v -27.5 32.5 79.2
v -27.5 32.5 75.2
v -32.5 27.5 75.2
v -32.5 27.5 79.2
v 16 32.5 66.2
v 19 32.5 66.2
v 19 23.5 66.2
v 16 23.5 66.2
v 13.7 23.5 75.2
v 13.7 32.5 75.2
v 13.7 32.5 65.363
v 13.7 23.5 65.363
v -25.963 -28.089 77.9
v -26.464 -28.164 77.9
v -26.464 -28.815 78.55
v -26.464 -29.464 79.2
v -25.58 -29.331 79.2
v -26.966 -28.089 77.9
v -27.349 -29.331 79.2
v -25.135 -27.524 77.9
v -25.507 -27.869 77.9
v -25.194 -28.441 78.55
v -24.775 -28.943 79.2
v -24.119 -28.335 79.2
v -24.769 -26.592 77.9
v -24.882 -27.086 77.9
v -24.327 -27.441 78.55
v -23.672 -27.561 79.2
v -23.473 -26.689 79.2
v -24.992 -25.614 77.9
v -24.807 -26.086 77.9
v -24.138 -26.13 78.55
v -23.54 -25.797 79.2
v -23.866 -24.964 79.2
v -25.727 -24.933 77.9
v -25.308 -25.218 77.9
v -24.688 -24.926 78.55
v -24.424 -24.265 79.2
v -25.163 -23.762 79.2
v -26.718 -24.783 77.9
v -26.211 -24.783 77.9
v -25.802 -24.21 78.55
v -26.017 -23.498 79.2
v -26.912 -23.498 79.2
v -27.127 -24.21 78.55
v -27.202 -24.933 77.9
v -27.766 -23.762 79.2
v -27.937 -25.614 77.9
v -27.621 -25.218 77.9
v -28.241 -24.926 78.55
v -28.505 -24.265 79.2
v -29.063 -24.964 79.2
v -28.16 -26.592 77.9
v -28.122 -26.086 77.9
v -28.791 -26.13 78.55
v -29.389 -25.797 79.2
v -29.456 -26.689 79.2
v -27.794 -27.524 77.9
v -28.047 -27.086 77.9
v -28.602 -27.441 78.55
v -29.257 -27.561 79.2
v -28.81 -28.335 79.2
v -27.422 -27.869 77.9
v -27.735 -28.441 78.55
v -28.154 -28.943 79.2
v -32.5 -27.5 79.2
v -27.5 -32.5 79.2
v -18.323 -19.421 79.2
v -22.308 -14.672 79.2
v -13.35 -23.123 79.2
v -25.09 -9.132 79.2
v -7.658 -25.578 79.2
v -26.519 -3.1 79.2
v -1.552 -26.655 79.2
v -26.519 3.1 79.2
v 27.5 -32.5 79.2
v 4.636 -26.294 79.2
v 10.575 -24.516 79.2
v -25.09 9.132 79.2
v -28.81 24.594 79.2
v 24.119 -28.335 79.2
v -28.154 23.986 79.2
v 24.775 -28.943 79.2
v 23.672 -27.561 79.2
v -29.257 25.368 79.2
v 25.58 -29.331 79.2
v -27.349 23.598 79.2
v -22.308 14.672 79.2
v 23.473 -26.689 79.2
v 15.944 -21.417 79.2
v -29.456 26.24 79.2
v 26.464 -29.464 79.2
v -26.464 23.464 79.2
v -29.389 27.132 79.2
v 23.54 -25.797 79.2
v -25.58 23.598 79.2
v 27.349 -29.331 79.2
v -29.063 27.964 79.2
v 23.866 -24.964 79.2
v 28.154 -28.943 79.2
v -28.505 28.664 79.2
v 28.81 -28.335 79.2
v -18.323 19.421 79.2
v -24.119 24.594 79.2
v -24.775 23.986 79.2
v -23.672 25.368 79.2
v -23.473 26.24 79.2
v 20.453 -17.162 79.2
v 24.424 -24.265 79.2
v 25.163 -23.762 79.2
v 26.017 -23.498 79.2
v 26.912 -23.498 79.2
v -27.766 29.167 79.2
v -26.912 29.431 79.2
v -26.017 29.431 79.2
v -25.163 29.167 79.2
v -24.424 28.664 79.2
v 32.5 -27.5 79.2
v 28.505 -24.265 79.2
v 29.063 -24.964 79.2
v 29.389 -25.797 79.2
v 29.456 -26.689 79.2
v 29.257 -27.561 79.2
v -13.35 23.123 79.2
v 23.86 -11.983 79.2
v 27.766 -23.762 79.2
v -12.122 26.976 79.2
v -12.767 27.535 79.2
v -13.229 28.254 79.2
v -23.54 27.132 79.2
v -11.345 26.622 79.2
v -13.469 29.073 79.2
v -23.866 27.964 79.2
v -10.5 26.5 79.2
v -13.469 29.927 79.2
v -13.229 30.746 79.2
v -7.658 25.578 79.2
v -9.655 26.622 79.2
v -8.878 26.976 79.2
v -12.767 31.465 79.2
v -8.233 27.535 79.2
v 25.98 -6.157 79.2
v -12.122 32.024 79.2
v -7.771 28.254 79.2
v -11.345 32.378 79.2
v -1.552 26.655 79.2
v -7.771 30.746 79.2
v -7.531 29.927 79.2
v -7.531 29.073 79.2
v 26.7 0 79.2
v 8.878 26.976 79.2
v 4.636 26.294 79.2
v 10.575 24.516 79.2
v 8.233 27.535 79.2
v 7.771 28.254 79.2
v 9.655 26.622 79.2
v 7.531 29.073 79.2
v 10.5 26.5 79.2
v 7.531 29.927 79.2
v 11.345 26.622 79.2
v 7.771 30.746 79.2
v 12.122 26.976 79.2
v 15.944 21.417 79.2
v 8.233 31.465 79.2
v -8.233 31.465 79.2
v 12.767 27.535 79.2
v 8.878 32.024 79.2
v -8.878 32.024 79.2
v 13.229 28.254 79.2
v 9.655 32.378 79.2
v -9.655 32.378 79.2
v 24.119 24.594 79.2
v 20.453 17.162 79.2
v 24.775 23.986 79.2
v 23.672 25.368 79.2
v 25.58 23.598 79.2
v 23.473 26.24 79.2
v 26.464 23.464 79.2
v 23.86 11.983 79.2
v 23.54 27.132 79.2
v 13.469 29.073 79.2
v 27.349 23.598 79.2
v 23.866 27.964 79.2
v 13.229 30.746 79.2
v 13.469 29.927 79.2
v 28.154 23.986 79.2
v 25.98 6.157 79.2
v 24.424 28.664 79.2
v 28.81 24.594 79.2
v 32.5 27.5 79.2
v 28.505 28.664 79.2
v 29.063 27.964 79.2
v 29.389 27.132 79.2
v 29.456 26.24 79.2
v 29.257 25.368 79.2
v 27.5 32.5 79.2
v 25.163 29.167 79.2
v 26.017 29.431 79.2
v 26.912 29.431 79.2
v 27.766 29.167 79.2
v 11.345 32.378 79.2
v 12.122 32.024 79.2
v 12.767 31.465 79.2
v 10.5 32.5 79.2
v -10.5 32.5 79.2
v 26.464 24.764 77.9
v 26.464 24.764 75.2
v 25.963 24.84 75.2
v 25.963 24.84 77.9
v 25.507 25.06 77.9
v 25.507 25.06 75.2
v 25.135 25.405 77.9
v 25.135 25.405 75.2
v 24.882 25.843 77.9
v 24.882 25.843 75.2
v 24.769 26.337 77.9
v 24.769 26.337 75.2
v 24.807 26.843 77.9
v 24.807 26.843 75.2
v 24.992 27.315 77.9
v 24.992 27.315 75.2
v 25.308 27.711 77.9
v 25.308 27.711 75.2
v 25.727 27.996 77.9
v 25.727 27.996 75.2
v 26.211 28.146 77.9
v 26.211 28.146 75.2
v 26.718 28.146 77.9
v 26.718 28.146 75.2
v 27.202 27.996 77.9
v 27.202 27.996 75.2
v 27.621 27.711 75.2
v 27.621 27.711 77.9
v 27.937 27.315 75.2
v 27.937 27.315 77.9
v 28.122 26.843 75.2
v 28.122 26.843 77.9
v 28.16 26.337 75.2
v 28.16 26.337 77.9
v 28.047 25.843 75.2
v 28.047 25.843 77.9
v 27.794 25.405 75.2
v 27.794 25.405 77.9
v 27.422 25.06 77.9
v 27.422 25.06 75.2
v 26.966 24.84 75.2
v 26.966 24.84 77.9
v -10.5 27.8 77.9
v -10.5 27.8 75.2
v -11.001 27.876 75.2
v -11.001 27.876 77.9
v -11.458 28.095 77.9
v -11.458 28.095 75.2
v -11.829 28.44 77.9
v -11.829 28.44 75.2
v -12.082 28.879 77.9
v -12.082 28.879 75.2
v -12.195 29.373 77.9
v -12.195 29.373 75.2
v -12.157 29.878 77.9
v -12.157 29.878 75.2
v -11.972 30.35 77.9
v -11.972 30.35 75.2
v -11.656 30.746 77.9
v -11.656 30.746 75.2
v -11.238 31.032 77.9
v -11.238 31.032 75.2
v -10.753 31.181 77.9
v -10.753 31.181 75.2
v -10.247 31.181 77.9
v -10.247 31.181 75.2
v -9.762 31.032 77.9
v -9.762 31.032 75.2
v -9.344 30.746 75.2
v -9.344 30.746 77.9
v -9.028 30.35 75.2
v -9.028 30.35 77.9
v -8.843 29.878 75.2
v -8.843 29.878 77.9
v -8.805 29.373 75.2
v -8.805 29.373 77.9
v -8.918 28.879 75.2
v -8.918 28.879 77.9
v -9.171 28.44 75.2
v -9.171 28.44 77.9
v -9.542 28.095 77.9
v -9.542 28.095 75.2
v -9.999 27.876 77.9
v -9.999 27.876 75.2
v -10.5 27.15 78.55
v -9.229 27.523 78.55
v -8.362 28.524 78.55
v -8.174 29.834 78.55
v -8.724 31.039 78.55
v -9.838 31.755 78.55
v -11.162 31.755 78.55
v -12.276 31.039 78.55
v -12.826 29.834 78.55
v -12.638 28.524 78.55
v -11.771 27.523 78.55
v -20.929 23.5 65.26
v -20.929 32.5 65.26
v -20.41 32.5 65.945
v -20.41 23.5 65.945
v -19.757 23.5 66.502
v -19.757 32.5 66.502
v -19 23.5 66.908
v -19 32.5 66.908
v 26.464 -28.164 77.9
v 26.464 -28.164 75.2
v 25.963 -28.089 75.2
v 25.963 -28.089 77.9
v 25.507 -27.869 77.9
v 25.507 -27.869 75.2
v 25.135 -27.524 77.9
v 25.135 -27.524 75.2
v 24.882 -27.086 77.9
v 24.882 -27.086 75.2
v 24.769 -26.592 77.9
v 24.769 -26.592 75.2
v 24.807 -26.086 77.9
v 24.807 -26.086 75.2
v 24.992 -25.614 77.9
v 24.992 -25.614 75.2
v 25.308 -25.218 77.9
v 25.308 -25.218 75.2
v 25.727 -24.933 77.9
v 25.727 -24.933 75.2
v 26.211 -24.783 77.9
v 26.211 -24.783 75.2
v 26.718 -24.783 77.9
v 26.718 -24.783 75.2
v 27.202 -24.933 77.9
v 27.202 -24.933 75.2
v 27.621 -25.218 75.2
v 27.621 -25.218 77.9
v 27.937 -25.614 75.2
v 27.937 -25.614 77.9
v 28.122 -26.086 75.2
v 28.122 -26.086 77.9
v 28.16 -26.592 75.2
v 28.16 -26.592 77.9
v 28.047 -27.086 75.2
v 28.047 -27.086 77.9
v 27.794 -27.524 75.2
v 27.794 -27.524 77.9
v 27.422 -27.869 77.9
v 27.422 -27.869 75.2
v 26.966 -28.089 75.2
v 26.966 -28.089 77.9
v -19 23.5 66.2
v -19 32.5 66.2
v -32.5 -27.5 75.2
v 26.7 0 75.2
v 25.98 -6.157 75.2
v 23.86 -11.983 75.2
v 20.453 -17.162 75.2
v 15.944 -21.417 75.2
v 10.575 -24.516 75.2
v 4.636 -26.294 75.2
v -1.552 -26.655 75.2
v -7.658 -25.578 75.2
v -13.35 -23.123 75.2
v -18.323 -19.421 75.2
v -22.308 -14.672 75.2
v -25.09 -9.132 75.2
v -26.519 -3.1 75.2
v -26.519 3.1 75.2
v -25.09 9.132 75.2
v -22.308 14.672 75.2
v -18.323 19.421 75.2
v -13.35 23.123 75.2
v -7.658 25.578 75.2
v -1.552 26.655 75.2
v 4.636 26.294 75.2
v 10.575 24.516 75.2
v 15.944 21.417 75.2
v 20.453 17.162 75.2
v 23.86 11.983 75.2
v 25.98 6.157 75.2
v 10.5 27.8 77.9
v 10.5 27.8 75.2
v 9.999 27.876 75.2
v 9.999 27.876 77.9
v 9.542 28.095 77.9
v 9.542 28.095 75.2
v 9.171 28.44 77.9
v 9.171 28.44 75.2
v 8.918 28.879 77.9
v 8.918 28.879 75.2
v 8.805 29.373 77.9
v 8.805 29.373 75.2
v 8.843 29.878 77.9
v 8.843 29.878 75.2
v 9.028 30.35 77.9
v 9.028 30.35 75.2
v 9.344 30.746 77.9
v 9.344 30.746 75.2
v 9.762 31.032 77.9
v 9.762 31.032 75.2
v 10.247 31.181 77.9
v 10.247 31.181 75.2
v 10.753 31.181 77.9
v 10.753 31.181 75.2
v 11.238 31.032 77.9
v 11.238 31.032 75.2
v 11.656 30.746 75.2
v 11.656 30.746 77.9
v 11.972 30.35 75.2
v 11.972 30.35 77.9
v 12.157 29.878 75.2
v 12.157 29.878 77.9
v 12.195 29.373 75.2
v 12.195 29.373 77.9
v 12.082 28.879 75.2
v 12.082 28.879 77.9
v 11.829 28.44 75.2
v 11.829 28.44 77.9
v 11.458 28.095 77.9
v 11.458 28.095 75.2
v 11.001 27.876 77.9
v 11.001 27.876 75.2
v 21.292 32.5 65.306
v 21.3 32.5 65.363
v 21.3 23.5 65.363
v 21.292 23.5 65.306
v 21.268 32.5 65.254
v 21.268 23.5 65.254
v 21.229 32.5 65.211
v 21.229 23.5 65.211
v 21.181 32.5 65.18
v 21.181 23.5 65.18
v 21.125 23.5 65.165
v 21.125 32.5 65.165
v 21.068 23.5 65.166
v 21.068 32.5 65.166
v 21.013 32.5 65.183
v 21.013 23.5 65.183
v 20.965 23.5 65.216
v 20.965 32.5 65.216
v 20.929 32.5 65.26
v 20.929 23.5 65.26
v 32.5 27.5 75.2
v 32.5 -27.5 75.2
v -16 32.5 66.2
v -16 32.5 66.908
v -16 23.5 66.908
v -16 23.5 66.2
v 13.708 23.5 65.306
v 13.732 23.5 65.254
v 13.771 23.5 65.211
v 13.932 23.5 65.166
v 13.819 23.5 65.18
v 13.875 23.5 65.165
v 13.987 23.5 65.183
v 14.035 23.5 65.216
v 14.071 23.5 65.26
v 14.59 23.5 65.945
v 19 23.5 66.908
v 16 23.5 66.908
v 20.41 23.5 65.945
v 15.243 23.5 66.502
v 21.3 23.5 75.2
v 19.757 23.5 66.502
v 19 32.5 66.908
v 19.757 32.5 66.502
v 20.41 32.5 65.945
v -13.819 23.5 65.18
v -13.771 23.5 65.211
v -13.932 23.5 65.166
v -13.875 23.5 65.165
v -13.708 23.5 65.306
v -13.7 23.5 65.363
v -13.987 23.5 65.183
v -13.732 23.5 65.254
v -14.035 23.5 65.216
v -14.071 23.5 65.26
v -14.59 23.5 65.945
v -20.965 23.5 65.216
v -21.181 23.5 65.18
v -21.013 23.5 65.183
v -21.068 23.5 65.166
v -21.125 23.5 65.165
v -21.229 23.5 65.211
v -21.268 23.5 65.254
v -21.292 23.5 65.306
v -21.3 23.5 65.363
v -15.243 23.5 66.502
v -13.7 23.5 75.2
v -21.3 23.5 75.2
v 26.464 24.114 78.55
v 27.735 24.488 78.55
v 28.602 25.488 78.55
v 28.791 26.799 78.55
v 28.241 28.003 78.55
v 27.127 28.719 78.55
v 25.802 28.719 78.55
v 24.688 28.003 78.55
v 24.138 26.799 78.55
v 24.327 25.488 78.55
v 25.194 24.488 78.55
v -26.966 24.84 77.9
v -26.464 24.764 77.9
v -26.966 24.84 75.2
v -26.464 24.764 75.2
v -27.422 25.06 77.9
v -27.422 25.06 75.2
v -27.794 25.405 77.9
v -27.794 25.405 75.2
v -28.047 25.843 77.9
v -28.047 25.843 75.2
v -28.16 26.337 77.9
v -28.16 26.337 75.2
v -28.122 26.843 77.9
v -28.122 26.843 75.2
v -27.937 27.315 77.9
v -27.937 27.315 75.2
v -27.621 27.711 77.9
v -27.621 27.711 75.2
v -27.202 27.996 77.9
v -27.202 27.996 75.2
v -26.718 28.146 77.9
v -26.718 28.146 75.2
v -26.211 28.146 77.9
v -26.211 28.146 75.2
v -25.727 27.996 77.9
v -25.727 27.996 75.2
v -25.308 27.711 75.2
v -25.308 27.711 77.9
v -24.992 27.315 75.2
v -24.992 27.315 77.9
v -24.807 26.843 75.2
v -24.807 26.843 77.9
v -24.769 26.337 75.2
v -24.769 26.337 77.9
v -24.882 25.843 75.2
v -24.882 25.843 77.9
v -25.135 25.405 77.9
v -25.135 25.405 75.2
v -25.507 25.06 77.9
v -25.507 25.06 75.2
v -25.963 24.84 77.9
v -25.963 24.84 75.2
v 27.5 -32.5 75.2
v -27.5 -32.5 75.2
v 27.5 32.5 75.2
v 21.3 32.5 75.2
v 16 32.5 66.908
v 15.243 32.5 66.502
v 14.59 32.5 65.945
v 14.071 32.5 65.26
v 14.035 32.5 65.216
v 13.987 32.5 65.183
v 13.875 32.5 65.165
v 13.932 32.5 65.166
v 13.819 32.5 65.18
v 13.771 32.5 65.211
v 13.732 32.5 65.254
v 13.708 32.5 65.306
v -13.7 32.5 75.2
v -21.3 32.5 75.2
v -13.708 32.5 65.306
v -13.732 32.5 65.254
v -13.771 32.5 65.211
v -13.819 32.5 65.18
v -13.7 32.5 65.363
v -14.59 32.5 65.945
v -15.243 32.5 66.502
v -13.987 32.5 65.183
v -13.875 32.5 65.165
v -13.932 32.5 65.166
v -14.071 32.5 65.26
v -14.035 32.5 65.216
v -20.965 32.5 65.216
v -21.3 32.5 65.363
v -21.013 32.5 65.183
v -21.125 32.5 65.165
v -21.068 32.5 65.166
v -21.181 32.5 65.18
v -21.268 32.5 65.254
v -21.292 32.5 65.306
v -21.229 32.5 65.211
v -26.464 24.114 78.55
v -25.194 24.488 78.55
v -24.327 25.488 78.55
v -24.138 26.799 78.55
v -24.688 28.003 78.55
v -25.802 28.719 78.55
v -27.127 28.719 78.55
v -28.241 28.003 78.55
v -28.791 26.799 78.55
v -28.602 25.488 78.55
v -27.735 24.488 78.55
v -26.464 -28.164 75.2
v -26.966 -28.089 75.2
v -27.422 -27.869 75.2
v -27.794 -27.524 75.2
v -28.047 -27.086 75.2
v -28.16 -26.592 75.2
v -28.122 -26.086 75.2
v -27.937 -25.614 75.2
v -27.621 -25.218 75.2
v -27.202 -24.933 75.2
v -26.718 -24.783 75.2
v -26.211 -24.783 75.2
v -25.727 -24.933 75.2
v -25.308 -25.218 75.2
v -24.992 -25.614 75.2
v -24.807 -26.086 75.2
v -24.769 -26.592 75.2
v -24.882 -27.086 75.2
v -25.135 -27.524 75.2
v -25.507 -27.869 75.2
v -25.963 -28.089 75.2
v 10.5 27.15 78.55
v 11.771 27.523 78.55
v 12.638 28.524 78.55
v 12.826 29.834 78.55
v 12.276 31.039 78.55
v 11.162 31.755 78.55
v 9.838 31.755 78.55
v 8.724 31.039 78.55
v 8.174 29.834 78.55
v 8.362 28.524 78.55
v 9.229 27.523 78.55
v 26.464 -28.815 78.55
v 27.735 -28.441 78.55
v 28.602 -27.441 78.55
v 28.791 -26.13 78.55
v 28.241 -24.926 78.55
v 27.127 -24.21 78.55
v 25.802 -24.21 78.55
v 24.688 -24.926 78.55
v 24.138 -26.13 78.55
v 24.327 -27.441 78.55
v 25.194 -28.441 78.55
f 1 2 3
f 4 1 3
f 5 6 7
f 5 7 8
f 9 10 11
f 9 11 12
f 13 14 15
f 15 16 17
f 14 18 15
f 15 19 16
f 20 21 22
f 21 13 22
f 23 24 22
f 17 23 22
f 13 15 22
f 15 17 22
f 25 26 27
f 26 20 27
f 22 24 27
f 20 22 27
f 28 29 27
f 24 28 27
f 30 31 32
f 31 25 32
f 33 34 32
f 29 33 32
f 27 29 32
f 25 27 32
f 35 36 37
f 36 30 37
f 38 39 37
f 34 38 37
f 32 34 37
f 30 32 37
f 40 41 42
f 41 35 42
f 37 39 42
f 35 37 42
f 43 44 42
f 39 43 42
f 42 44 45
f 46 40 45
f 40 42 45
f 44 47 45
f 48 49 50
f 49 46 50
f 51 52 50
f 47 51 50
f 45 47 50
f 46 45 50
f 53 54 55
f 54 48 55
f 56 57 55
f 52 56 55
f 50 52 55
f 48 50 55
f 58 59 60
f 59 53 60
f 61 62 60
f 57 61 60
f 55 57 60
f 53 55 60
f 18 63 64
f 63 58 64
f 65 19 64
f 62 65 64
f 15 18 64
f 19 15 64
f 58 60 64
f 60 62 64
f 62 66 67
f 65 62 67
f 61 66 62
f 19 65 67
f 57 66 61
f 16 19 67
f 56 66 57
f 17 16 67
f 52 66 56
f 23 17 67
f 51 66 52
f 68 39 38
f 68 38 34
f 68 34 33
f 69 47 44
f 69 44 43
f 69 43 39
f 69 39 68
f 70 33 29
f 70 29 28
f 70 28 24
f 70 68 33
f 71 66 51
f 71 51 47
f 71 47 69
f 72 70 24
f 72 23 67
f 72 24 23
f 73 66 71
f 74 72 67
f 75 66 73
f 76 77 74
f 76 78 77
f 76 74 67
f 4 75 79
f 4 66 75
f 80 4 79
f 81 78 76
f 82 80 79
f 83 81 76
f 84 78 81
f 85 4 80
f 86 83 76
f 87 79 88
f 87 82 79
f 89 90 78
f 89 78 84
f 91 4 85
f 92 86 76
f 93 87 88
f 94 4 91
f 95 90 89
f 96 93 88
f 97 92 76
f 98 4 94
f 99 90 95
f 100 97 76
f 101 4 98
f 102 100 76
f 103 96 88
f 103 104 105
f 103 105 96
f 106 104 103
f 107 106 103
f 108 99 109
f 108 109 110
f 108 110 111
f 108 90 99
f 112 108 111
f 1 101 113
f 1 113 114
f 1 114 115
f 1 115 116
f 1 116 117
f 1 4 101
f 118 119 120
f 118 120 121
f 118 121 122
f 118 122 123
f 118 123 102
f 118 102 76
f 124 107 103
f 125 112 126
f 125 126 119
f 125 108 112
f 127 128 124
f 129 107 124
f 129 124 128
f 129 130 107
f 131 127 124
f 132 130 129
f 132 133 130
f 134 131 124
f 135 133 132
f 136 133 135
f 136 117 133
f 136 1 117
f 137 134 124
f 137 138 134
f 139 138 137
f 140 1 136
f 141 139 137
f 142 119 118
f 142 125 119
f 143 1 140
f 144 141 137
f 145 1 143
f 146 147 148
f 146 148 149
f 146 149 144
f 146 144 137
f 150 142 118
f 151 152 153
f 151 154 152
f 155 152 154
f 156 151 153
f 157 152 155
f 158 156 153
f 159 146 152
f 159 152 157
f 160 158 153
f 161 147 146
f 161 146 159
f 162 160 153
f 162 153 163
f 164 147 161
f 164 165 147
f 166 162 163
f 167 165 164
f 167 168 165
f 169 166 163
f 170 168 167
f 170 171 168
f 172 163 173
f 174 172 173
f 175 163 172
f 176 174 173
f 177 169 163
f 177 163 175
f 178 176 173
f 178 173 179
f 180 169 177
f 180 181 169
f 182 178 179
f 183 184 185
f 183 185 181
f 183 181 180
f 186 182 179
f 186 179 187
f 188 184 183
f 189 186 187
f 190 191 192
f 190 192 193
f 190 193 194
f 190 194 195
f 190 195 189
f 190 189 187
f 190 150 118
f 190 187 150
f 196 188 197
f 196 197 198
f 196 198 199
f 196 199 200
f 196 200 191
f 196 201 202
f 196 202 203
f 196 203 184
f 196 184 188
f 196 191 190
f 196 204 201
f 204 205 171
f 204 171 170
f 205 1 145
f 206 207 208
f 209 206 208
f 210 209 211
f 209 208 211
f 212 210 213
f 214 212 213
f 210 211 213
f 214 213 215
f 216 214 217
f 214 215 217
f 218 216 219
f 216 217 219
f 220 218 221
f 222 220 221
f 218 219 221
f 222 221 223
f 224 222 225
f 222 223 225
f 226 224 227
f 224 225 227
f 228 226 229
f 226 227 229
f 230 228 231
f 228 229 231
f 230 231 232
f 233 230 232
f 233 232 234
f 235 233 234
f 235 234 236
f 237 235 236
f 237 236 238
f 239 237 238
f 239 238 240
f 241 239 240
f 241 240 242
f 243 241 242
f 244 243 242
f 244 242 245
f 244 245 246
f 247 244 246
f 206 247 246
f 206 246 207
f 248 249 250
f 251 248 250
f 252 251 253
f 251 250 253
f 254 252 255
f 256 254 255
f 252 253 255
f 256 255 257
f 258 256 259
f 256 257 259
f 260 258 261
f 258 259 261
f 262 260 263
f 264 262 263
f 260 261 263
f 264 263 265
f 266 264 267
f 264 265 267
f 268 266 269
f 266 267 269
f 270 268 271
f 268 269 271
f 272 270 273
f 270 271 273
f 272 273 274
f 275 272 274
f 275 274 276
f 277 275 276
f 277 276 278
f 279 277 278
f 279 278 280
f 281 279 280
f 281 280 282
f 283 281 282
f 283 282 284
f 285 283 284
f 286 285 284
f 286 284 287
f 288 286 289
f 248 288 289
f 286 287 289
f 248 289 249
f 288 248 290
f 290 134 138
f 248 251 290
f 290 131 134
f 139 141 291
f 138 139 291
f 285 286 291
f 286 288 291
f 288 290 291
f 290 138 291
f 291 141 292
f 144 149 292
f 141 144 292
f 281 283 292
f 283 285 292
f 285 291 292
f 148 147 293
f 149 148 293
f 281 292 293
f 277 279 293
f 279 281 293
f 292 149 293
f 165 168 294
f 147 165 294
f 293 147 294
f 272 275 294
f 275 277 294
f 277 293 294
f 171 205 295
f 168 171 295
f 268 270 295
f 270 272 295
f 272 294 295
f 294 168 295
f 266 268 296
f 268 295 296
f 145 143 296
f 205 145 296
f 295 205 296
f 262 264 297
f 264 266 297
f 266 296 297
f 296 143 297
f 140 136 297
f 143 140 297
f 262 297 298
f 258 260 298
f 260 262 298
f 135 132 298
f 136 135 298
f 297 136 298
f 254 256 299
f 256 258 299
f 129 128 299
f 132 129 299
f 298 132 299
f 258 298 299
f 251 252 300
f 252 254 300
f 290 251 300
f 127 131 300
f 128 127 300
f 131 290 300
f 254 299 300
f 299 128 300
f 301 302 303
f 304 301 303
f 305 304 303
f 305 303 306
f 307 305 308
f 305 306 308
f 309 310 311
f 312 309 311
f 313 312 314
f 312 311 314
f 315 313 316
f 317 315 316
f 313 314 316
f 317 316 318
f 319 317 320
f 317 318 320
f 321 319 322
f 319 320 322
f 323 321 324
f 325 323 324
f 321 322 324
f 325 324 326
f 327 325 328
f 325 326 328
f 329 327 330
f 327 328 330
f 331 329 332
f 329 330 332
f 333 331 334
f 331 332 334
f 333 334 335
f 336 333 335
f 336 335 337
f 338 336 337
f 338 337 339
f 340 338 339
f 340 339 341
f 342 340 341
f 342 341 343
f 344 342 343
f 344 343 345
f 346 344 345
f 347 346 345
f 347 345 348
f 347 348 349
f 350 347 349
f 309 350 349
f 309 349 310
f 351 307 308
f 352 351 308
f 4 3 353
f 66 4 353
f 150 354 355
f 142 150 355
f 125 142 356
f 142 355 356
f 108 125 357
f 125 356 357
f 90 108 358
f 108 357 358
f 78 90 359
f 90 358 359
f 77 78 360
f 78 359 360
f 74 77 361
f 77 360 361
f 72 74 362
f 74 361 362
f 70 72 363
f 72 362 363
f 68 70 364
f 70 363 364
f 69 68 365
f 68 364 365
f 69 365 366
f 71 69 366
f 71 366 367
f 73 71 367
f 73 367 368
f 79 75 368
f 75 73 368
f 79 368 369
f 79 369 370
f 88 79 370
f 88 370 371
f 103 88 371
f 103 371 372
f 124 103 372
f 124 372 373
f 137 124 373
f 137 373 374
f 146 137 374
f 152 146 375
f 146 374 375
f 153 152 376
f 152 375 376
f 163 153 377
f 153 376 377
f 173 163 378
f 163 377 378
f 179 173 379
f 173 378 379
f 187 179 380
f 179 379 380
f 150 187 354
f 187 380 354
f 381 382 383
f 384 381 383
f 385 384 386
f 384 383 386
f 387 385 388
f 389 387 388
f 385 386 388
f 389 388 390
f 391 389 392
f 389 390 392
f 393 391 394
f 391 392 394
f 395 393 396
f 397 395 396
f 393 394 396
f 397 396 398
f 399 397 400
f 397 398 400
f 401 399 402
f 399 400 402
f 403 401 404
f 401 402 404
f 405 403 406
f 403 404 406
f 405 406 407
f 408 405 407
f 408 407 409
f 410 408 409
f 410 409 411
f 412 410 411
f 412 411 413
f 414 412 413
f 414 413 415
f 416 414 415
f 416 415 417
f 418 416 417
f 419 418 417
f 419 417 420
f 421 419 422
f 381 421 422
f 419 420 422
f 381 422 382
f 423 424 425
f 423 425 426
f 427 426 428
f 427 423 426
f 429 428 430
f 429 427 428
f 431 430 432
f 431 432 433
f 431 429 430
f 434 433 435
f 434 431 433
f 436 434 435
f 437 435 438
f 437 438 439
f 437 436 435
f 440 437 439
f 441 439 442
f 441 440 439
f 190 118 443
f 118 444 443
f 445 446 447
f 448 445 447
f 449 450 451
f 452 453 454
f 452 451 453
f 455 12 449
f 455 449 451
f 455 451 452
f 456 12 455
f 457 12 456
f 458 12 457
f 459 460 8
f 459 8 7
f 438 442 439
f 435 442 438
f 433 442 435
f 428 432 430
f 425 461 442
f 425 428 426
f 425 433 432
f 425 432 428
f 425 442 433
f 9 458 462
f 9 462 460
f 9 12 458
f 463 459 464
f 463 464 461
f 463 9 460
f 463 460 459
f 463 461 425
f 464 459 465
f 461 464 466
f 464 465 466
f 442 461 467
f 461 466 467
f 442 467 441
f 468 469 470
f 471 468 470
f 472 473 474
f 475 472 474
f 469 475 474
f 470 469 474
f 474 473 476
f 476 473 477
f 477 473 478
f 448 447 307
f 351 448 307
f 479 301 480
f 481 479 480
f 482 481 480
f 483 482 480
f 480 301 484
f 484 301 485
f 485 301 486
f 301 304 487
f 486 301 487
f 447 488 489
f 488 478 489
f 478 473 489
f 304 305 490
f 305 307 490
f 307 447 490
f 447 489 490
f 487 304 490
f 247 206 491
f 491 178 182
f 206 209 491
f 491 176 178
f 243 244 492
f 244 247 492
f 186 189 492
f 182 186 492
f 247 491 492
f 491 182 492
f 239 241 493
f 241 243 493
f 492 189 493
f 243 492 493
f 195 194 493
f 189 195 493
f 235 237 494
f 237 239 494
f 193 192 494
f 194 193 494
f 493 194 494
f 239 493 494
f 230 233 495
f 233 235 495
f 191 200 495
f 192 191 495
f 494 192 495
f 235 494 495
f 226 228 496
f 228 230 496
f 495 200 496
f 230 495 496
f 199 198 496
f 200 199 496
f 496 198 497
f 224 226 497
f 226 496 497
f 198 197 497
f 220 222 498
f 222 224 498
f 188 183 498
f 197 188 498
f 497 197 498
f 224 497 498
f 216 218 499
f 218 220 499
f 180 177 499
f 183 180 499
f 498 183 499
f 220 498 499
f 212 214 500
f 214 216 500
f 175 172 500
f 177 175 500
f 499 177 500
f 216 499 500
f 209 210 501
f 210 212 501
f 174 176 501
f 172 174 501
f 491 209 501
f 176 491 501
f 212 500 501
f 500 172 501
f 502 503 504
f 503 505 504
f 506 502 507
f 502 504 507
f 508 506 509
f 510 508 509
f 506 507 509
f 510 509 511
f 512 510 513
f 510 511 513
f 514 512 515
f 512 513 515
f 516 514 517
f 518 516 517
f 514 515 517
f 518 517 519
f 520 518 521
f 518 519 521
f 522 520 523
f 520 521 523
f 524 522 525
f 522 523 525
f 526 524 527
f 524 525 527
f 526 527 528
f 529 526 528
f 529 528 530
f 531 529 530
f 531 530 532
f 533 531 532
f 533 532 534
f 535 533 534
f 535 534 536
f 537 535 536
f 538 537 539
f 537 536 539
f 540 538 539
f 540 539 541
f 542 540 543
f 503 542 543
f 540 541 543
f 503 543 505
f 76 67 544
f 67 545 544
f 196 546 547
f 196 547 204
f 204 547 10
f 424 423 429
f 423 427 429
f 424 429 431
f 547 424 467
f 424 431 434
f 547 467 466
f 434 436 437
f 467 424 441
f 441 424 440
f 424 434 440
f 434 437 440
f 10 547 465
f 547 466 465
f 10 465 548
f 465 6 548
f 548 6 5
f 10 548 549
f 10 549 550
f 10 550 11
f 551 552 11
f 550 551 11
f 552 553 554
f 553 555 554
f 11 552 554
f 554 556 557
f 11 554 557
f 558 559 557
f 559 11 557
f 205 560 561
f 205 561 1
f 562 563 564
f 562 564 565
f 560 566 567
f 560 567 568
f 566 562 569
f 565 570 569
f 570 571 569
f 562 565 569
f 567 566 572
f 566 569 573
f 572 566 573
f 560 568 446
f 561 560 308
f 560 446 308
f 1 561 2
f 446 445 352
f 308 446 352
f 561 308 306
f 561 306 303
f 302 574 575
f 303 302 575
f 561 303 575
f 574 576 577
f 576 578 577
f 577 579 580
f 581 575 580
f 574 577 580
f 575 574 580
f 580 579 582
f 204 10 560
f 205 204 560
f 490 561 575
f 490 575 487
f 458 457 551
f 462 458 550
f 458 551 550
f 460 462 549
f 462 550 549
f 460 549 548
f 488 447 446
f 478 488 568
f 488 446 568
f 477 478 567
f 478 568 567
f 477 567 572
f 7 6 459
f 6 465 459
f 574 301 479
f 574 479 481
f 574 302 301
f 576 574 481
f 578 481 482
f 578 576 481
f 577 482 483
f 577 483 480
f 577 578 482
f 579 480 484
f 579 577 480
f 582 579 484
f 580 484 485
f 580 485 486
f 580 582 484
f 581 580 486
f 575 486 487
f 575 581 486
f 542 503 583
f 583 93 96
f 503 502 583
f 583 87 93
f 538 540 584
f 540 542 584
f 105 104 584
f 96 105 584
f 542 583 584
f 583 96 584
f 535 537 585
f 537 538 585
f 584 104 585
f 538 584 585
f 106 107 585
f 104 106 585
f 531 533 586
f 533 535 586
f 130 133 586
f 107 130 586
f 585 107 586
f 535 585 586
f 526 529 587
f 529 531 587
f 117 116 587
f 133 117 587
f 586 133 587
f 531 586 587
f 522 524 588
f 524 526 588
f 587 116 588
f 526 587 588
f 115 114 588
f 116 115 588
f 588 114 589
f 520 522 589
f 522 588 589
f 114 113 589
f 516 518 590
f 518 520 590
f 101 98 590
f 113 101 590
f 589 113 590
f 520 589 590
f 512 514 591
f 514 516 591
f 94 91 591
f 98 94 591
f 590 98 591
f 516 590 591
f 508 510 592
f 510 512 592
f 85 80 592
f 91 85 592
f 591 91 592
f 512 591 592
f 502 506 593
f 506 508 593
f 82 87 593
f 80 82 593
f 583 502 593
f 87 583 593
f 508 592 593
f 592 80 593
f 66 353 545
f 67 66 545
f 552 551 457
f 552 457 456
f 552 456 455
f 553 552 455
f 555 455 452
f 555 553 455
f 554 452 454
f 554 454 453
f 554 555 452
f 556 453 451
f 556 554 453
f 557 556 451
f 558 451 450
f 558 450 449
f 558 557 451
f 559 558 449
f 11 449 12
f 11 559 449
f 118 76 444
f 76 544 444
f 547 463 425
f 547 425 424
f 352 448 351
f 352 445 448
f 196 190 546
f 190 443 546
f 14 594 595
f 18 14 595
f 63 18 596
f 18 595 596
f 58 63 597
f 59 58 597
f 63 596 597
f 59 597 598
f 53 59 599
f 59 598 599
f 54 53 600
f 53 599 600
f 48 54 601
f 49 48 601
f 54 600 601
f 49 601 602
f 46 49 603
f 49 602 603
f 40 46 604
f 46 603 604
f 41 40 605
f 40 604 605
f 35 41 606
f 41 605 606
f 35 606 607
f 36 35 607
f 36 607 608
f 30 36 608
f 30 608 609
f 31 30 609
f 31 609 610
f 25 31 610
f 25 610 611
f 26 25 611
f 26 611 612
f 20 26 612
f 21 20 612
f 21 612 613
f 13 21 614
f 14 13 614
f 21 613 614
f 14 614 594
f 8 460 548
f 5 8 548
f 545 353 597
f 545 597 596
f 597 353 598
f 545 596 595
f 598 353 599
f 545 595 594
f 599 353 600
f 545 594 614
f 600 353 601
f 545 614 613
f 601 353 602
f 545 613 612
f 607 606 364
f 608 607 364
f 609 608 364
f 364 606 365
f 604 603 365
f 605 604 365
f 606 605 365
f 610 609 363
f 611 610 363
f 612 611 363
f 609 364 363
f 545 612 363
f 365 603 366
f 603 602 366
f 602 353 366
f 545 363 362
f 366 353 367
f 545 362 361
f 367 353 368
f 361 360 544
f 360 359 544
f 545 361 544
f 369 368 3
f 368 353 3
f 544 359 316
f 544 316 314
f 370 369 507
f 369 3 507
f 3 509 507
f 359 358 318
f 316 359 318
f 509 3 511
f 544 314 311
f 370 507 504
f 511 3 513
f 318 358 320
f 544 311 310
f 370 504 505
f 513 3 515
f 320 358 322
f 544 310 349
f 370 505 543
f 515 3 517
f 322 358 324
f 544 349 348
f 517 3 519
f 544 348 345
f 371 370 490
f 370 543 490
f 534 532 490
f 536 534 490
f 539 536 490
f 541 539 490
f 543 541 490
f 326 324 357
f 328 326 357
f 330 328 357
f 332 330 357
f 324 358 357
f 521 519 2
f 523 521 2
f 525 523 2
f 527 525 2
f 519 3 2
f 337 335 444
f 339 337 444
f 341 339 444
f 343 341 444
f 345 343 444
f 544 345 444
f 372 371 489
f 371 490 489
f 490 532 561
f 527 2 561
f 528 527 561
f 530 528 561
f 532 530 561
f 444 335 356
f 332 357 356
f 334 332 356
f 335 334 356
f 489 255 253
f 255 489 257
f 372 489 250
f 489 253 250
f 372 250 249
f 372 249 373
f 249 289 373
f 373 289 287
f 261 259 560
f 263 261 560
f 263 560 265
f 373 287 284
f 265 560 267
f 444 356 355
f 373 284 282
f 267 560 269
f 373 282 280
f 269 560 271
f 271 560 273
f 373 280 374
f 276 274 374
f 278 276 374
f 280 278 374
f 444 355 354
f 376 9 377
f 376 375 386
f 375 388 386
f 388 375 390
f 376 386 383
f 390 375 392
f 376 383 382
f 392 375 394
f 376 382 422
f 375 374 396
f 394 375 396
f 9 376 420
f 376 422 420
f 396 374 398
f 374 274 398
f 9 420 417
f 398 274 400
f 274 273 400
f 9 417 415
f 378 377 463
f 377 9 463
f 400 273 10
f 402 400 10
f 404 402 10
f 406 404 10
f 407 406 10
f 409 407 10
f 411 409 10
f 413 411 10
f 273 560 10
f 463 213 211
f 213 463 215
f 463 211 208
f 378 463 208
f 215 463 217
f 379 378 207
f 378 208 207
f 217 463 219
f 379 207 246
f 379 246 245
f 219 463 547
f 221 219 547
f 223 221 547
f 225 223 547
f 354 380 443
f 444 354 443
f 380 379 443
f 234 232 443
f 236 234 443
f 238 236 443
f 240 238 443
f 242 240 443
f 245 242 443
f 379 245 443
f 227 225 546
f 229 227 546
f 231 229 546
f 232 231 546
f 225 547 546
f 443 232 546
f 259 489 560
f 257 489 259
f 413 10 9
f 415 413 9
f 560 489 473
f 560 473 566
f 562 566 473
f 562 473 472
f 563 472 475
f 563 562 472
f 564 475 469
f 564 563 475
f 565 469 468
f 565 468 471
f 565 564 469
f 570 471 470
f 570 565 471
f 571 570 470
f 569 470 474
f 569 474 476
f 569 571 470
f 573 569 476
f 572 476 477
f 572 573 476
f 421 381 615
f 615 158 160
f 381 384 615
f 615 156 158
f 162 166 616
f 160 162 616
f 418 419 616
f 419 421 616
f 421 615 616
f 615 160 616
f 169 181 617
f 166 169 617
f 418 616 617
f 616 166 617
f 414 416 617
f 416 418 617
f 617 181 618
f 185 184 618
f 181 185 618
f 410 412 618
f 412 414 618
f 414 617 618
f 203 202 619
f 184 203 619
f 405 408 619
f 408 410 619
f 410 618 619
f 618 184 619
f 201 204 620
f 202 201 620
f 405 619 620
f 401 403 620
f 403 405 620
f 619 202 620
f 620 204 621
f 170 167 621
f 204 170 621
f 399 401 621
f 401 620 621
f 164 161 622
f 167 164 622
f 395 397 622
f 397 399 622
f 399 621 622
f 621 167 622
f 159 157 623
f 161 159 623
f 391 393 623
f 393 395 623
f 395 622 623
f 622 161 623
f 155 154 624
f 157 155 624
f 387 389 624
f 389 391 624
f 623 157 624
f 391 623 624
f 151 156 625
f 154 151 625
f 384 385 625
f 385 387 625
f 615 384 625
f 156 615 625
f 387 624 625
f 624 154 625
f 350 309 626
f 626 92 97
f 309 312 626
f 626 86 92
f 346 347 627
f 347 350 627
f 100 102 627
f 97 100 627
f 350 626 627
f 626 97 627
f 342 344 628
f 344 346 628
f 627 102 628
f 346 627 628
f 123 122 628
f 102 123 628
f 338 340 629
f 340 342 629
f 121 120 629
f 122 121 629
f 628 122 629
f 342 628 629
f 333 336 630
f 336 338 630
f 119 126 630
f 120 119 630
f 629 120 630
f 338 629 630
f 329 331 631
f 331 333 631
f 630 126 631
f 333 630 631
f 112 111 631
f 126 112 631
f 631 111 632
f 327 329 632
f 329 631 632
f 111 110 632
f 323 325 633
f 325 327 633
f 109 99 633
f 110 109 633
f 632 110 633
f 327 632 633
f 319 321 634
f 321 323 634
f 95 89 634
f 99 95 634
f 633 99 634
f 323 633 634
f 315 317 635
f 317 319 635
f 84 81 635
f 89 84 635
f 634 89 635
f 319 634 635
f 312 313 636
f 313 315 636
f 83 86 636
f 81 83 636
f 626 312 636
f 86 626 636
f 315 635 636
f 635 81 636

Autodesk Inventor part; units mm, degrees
ref_plane "YZ Plane" through (0, 0, 0) normal (1, 0, 0) x (0, 1, 0)
ref_plane "XZ Plane" through (0, 0, 0) normal (0, 1, 0) x (-1, 0, 0)
ref_plane "РабПлоскость1" through (0, 0, 75.2) normal (0, 0, 1) x (1, 0, 0)
sketch "Эскиз1" plane through (0, 0, 75.2) normal (0, 0, 1) x (1, 0, 0)
  circle A0 centre (26.4645, -26.4645) radius 1.95 construction
  circle A1 centre (-26.4645, 26.4645) radius 1.95 construction
  circle A2 centre (26.4645, 26.4645) radius 1.95 construction
  circle A3 centre (-26.4645, -26.4645) radius 1.95 construction
  circle A4 centre (15.35, -15.35) radius 1.7 construction
  circle A5 centre (-15.35, 15.35) radius 1.7 construction
  circle A6 centre (15.35, 15.35) radius 1.7 construction
  circle A7 centre (-15.35, -15.35) radius 1.7 construction
  line L0 (-32.5, 27.5) -> (-32.5, -27.5) projected
  line L1 (-27.5, 32.5) -> (-32.5, 27.5) projected
  line L2 (27.5, 32.5) -> (-27.5, 32.5) projected
  line L3 (32.5, 27.5) -> (27.5, 32.5) projected
  line L4 (32.5, -27.5) -> (32.5, 27.5) projected
  line L5 (27.5, -32.5) -> (32.5, -27.5) projected
  line L6 (-27.5, -32.5) -> (27.5, -32.5) projected
  line L7 (-32.5, -27.5) -> (-27.5, -32.5) projected
  circle A8 centre (0, 0) radius 11.5 construction
  circle A9 centre (0, 0) radius 26.7 projected
  point P0 (0, 0)
extrude "Выдавливание1" add sketch "Эскиз1" along normal blind 4
sketch "Эскиз2" plane through (0, 0, 79.2) normal (0, 0, 1) x (1, 0, 0)
  circle A0 centre (26.4645, 26.4645) radius 2.25 projected
  circle A1 centre (26.4645, -26.4645) radius 2.25 projected
  circle A2 centre (-26.4645, -26.4645) radius 2.25 projected
  circle A3 centre (-26.4645, 26.4645) radius 1.95 projected
  circle A4 centre (10.5, 29.5) radius 2.25 construction
  circle A5 centre (-10.5, 29.5) radius 1.65 construction
hole "Отверстие1" at (26.4645, 26.4645, 79.2) at (-26.4645, 26.4645, 79.2) at (26.4645, -26.4645, 79.2) at (-26.4645, -26.4645, 79.2) at (10.5, 29.5, 79.2) at (-10.5, 29.5, 79.2) direction (0, 0, -1) diameter 3.4 end through all countersink diameter 6 countersink angle 90 clearance for "с потайной головкой ГОСТ 12876-67" size "M3" standard "ГОСТ"
sketch "Эскиз3" plane through (0, 0, 75.2) normal (0, 0, -1) x (-1, 0, 0)
  line L0 (-21.5, 32.5) -> (-13.5, 32.5) construction
  line L1 (-13.5, 32.5) -> (-13.5, 22.5) construction
  line L2 (-13.5, 22.5) -> (-21.5, 22.5) construction
  line L3 (-21.5, 22.5) -> (-21.5, 32.5) construction
  line L4 (13.5, 32.5) -> (21.5, 32.5) construction
  line L5 (21.5, 32.5) -> (21.5, 22.5) construction
  line L6 (21.5, 22.5) -> (13.5, 22.5) construction
  line L7 (13.5, 22.5) -> (13.5, 32.5) construction
  line L8 (0, 0) -> (0, 42.6658) construction
  line L9 (-27.5, 32.5) -> (27.5, 32.5) construction
  line L10 (-21.3, 32.5) -> (-13.7, 32.5)
  line L11 (-13.7, 32.5) -> (-13.7, 23.5)
  line L12 (-13.7, 23.5) -> (-21.3, 23.5)
  line L13 (-21.3, 23.5) -> (-21.3, 32.5)
  line L14 (13.7, 32.5) -> (21.3, 32.5)
  line L15 (21.3, 32.5) -> (21.3, 23.5)
  line L16 (21.3, 23.5) -> (13.7, 23.5)
  line L17 (13.7, 23.5) -> (13.7, 32.5)
  dimension "d9" = 10
  dimension "d10" = 0.2
  dimension "d11" = 0.2
  dimension "d12" = 9
extrude "Выдавливание2" add sketch "Эскиз3" along normal blind 12
sketch "Эскиз4" plane through (-27.5, 32.5, 79.2) normal (0, 1, 0) x (1, 0, 0)
  arc A0 (14, 16) -> (6, 16) centre (10, 16) ccw
  arc A1 (49, 16) -> (41, 16) centre (45, 16) ccw
  circle A2 centre (45, 16) radius 4
  circle A3 centre (10, 16) radius 4
  point P0 (27.5, 79.2)
extrude "Выдавливание3" cut sketch "Эскиз4" against normal through all
fillet "Сопряжение1" radius 0.2 4 edges at (-21.3, 28, 64.449) (-13.7, 28, 64.449) (13.7, 28, 64.449) (21.3, 28, 64.449)
sketch "Эскиз5" plane through (0, 0, 75.2) normal (0, 0, -1) x (-1, 0, 0)
  line L0 (14.0714, 23.5) -> (14.0714, 32.5) construction
  line L1 (20.9286, 23.5) -> (14.0714, 23.5) construction
  line L2 (20.9286, 32.5) -> (20.9286, 23.5) construction
  line L3 (14.0714, 32.5) -> (20.9286, 32.5) construction
  line L4 (-20.9286, 23.5) -> (-20.9286, 32.5) construction
  line L5 (-14.0714, 23.5) -> (-20.9286, 23.5) construction
  line L6 (-14.0714, 32.5) -> (-14.0714, 23.5) construction
  line L7 (-20.9286, 32.5) -> (-14.0714, 32.5) construction
  line L8 (20.9286, 23.5) -> (14.0714, 32.5) construction
  line L9 (19, 32.5) -> (16, 32.5)
  line L10 (16, 32.5) -> (16, 23.5)
  line L11 (16, 23.5) -> (19, 23.5)
  line L12 (19, 23.5) -> (19, 32.5)
  line L13 (19, 32.5) -> (16, 23.5) construction
  line L14 (16, 32.5) -> (19, 23.5) construction
  point P0 (0, 0)
  point P1 (17.5, 28)
  dimension "d18" = 3
extrude "Выдавливание4" add sketch "Эскиз5" along normal blind 9
mirror "Зеркальное отражение1" about plane through (0, 0, 0) normal (1, 0, 0) of "Выдавливание4"
equation "\"d11\" = d10"
properties part number "Крышка" material "По умолчанию1"
